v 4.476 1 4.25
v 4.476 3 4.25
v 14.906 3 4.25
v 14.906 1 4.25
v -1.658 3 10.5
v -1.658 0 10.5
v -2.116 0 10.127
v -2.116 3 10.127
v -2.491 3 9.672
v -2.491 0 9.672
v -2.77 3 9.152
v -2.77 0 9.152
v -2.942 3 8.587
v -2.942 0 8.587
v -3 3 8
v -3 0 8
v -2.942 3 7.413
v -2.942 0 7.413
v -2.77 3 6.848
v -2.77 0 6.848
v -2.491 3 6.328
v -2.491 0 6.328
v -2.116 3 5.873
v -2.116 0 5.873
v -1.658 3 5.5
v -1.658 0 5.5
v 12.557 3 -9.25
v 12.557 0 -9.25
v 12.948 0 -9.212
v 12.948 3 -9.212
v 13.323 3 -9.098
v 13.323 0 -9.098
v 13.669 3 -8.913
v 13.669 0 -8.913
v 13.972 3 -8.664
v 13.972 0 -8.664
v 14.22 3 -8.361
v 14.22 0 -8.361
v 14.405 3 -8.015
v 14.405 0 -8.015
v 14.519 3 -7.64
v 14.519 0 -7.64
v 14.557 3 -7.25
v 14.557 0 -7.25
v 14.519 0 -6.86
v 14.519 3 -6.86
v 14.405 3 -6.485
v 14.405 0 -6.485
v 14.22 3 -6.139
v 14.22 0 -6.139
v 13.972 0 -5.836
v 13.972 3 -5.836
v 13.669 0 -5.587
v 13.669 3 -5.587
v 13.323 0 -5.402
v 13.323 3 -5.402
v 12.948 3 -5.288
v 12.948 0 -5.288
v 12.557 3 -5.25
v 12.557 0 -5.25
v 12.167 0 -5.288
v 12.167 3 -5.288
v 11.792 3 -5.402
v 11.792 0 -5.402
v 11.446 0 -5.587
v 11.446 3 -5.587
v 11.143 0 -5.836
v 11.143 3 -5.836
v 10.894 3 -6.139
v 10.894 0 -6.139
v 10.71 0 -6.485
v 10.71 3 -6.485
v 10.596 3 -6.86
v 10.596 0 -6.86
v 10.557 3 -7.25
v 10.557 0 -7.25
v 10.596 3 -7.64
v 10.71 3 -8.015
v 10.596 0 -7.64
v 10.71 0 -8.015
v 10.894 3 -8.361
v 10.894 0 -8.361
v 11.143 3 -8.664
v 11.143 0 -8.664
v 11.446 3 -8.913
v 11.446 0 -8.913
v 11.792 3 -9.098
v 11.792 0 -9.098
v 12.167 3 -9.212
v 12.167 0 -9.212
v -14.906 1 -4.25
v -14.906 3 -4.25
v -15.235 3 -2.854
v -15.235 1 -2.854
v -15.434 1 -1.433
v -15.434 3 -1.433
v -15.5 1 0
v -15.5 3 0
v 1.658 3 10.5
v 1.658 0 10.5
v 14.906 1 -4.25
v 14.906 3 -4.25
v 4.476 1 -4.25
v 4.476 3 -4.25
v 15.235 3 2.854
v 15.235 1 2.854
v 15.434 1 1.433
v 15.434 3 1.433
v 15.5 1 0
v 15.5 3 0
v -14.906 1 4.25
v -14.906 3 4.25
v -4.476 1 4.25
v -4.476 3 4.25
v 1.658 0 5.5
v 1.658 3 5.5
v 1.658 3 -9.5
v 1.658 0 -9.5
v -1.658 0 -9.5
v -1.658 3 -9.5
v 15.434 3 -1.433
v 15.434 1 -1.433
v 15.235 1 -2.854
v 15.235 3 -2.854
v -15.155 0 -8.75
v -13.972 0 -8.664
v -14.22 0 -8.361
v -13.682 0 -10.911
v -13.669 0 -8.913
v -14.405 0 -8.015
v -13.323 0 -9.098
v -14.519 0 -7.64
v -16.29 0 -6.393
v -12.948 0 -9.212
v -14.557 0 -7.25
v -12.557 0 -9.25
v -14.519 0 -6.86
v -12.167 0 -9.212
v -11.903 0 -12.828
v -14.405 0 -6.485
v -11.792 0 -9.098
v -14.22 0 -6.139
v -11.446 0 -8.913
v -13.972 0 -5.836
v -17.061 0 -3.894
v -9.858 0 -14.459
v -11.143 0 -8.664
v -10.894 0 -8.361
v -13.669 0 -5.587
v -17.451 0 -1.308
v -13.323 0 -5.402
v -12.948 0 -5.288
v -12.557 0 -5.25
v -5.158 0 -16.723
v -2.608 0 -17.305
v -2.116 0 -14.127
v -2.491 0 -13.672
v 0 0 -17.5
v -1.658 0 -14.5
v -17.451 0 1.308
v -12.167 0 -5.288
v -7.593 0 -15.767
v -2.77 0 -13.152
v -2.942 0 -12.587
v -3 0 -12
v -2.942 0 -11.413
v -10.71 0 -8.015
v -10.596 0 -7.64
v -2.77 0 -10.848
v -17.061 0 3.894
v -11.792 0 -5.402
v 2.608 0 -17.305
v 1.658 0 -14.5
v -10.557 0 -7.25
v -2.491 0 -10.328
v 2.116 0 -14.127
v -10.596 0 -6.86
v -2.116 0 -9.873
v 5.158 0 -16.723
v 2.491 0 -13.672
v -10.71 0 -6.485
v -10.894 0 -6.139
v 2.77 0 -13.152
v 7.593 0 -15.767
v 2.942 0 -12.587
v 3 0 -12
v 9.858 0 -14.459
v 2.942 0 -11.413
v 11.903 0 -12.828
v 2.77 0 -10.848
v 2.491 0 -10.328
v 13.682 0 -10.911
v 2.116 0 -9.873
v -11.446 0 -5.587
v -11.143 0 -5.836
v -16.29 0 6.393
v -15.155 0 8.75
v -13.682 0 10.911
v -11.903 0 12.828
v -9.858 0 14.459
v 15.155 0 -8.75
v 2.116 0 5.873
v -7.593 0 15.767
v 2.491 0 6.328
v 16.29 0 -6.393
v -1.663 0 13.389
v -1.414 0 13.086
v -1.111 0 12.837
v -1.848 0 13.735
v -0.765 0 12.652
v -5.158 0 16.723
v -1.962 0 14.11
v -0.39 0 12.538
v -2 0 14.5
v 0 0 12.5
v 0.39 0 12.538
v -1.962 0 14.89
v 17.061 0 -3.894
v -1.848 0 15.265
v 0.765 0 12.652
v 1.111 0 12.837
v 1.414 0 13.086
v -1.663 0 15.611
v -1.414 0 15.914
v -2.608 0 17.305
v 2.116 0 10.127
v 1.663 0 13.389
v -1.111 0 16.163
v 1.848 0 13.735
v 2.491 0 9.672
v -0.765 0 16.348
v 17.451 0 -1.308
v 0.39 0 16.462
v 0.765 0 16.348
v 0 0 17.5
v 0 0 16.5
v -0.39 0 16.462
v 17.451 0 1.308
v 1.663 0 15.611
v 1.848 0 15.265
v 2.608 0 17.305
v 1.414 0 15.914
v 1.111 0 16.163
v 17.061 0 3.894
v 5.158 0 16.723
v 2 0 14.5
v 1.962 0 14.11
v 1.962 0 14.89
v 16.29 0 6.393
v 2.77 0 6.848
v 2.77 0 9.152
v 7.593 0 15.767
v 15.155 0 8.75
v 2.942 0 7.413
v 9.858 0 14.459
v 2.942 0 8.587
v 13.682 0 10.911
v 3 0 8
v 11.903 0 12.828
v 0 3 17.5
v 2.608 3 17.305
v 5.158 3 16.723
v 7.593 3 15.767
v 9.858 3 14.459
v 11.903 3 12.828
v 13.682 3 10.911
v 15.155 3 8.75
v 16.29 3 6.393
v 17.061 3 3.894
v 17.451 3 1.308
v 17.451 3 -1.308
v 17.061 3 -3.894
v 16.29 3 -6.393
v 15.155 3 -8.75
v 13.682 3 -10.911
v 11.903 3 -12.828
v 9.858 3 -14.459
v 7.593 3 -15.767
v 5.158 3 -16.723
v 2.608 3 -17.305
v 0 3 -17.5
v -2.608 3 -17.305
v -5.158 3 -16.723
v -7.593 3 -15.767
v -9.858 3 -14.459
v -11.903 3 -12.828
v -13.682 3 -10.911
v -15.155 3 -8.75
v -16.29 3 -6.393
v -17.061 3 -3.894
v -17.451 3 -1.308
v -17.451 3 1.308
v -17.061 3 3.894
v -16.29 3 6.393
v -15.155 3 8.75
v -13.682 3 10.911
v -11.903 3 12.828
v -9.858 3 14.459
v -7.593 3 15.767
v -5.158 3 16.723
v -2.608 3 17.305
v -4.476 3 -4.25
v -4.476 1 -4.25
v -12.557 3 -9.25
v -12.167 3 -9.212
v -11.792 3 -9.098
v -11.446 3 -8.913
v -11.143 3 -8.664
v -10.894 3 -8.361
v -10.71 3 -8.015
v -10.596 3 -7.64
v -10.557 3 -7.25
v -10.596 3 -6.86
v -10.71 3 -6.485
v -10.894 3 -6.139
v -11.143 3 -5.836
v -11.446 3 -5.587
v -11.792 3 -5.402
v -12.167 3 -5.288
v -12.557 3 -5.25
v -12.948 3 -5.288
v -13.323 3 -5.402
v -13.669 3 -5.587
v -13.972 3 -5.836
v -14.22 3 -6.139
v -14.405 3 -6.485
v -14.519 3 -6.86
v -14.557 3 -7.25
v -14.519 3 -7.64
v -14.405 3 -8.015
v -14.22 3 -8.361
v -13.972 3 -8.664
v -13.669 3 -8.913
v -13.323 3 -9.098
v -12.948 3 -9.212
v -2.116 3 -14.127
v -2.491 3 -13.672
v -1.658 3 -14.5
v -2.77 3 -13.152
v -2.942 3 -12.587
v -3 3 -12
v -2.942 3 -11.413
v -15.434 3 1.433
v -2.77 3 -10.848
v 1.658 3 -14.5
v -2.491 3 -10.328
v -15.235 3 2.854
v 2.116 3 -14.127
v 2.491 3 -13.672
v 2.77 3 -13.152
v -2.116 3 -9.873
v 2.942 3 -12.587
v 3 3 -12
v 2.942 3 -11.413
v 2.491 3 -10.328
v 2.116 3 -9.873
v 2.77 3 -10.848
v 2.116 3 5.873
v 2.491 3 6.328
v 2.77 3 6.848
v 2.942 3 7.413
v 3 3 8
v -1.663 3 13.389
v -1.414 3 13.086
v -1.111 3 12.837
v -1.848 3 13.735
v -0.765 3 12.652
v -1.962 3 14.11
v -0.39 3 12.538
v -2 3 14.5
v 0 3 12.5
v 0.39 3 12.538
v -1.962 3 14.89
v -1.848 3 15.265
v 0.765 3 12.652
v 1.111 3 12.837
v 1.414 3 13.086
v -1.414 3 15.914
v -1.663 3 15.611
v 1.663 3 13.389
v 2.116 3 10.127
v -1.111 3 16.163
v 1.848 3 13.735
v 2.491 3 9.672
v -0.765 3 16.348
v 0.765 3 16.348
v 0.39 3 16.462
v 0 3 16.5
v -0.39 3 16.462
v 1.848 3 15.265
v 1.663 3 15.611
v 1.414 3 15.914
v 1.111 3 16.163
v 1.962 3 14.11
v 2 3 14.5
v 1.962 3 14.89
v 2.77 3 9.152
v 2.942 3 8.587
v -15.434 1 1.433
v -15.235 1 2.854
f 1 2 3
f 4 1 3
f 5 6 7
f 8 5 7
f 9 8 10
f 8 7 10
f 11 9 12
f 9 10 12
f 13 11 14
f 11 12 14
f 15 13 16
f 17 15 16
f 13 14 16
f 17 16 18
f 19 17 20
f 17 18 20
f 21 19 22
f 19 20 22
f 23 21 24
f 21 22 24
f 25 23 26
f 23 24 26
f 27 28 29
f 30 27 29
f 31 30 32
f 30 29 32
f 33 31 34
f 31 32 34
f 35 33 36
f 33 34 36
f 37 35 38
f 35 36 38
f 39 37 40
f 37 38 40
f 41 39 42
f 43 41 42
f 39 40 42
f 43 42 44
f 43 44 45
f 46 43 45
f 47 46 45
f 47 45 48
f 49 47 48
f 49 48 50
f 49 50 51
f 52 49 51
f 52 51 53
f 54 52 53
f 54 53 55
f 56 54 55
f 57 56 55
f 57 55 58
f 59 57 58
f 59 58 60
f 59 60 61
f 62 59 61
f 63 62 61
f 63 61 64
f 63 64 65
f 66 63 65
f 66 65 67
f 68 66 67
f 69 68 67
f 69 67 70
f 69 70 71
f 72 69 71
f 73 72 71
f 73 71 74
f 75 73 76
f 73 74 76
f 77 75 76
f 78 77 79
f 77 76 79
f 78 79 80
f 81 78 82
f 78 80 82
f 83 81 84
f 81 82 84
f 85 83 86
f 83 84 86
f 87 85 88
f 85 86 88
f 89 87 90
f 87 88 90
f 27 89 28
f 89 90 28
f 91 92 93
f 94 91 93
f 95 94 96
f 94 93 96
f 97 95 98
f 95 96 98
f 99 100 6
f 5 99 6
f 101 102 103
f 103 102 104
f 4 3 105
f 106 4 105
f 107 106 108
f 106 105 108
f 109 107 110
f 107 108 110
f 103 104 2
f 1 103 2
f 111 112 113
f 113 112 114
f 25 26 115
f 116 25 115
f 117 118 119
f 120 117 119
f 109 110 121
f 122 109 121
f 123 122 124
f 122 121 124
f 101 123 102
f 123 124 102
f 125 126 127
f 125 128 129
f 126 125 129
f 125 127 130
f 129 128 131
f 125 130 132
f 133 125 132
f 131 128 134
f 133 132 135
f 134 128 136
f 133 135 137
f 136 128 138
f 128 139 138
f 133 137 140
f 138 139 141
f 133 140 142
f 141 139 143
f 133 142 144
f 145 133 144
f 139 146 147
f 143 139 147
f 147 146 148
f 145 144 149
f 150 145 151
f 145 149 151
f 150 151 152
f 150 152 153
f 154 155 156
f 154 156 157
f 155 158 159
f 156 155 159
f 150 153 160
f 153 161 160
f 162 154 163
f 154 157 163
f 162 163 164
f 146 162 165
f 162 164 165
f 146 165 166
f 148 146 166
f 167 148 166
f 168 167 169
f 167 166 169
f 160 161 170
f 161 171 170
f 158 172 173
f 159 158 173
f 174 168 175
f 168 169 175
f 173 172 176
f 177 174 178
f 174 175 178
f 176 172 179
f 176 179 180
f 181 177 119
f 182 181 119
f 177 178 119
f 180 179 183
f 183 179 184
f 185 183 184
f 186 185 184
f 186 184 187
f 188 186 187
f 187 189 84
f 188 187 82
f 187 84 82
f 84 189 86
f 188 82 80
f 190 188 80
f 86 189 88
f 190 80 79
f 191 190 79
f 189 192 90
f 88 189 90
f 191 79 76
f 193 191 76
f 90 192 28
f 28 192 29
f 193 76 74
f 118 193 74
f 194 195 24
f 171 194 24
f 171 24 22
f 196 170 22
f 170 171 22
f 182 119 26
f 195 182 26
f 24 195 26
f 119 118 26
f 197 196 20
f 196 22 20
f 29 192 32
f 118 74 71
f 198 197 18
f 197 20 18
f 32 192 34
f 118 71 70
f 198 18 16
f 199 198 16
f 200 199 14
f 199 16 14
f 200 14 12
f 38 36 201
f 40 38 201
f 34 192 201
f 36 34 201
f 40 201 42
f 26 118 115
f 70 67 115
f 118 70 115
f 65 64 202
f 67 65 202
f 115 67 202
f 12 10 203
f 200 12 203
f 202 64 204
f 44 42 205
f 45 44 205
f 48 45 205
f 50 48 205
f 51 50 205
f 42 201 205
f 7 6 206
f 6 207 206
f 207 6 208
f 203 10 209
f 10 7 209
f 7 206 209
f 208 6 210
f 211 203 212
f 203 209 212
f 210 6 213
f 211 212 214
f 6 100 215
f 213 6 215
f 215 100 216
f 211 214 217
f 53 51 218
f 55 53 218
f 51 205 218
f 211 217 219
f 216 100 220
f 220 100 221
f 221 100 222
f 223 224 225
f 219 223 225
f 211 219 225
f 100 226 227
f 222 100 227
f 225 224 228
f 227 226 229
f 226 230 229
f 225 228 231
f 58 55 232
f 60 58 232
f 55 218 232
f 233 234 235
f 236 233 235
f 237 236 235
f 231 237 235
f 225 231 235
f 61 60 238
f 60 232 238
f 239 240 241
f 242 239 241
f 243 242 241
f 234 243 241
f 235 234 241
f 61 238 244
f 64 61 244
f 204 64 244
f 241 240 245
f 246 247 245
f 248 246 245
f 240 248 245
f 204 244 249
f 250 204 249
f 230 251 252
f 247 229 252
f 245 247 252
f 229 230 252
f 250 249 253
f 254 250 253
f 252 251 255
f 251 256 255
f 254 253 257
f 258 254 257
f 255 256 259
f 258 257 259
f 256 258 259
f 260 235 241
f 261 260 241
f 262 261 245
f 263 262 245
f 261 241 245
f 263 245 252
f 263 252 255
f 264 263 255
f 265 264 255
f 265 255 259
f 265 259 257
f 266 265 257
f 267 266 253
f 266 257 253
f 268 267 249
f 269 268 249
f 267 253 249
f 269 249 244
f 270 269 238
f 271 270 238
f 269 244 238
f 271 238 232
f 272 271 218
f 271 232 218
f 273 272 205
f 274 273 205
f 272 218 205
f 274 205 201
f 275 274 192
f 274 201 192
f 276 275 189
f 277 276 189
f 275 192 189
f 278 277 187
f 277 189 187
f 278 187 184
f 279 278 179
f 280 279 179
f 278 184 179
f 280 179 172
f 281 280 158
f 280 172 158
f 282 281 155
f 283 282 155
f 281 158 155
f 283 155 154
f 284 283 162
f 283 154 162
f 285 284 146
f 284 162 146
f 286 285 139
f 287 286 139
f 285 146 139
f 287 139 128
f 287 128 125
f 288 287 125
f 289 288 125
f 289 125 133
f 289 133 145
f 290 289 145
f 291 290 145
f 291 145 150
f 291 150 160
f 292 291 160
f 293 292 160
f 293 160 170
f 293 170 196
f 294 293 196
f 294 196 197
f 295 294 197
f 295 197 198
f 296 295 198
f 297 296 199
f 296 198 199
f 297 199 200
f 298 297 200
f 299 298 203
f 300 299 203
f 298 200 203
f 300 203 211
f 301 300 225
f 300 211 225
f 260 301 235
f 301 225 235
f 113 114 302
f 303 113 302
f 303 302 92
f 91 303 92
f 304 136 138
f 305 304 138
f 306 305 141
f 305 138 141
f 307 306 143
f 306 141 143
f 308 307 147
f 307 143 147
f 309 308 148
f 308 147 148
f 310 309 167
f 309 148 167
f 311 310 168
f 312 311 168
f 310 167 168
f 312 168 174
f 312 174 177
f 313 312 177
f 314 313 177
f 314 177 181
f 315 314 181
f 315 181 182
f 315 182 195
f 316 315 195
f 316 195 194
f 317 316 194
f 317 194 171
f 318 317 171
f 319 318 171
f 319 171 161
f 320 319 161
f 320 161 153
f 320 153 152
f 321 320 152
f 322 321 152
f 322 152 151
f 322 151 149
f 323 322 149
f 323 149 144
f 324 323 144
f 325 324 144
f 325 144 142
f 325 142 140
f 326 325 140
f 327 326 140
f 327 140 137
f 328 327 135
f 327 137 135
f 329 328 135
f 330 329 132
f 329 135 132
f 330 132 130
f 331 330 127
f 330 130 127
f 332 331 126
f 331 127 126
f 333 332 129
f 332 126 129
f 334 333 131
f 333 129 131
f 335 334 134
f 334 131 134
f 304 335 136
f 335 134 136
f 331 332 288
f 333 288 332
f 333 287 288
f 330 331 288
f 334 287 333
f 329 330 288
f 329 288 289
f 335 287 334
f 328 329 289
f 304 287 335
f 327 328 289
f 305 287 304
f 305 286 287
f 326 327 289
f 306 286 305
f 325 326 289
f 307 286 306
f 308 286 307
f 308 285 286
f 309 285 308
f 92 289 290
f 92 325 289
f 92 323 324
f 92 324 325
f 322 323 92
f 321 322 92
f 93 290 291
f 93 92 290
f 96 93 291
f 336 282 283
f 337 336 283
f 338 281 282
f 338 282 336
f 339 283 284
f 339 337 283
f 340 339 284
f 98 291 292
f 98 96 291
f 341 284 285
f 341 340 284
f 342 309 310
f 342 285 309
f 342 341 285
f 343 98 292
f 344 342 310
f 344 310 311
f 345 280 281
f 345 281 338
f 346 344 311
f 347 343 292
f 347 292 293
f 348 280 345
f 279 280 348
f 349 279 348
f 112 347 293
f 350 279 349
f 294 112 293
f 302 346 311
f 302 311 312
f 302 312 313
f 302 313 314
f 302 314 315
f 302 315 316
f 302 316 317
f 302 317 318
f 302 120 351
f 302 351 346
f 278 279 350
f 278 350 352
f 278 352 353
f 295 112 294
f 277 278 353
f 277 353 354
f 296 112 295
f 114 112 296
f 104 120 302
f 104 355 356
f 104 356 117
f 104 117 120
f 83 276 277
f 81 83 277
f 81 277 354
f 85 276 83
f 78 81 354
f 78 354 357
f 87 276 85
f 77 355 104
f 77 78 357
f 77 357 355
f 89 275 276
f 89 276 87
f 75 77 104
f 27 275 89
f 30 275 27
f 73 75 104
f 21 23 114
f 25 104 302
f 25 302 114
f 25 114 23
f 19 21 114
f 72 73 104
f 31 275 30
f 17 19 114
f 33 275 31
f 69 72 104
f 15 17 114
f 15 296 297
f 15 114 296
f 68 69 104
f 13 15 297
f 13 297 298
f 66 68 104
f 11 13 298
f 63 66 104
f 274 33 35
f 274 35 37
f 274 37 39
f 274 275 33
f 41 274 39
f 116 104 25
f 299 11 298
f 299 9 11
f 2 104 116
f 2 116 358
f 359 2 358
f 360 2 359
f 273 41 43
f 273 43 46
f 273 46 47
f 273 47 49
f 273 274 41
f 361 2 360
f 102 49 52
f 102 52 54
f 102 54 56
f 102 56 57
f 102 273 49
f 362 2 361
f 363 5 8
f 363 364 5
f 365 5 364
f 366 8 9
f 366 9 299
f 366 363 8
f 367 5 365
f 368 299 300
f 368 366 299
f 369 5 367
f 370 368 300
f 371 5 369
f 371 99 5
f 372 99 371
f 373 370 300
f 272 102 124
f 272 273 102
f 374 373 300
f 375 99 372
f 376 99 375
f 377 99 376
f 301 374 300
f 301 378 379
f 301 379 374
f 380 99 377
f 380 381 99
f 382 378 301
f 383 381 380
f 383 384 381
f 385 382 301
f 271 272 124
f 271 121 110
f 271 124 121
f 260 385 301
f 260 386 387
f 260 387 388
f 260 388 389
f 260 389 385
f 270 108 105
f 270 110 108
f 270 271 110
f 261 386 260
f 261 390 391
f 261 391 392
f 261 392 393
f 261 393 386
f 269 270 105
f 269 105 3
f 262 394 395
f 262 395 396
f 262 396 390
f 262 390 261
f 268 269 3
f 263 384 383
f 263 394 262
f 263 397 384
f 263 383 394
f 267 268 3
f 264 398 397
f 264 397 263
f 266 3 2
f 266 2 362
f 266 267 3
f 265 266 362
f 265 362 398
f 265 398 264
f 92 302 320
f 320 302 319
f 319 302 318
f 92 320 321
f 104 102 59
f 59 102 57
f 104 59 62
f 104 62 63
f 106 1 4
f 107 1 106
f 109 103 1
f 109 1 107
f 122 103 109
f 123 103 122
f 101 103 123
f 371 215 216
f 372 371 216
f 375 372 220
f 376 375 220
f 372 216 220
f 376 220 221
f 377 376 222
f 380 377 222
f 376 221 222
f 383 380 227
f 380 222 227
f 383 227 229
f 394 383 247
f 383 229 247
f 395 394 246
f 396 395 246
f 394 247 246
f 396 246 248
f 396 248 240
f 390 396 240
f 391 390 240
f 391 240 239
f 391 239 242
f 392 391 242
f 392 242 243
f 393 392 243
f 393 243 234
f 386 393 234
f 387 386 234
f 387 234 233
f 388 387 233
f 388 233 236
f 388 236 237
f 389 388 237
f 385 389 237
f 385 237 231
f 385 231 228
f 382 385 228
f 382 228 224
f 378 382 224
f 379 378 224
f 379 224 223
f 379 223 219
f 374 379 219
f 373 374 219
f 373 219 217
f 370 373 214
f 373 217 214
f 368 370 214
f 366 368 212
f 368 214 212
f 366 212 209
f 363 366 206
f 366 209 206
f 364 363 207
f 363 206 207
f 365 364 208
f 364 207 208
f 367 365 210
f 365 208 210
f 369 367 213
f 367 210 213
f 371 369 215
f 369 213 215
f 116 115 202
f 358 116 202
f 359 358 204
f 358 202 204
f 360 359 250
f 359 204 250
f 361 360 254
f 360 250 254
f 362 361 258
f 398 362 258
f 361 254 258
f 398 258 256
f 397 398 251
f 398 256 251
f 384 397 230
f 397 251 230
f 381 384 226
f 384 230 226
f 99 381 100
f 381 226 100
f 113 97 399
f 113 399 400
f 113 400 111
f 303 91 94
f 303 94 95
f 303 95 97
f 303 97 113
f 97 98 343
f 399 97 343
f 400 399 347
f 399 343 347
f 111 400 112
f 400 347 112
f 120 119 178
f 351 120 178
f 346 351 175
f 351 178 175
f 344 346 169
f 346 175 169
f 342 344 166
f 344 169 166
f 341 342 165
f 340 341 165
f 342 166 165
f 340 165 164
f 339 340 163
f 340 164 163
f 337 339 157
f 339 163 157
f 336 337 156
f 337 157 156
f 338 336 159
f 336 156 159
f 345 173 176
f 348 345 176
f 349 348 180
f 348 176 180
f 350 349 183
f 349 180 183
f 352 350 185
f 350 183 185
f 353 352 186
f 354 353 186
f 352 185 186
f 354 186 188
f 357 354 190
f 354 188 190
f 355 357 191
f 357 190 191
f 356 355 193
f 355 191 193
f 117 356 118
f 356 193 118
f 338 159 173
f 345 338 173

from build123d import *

# Parameters (mm, degrees)
CROQUIS1_R              = 17.5
CROQUIS1_R_2            = 13.5
SALIENTE_EXTRUIR1_DEPTH = 3
CORTAR_EXTRUIR1_DEPTH   = 2
CROQUIS3_R              = 2
CORTAR_EXTRUIR2_DEPTH   = 25.929901725
CORTAR_EXTRUIR3_DEPTH   = 10


with BuildPart() as part:
    # Croquis1 → Saliente-Extruir1 (new body)
    with BuildSketch(Plane(origin=(0, 0, 0), x_dir=(1, 0, 0), z_dir=(0, 1, 0))):
        with Locations(Location((0, 0, 0), (0, 0, 270))):
            Circle(CROQUIS1_R)
        Circle(CROQUIS1_R_2, mode=Mode.SUBTRACT)
        Circle(CROQUIS1_R_2)
    extrude(amount=SALIENTE_EXTRUIR1_DEPTH)

    # Croquis2 → Cortar-Extruir1 (cut)
    with BuildSketch(Plane(origin=(0, 3, 0), x_dir=(1, 0, 0), z_dir=(0, 1, 0))):
        with BuildLine():
            Line((-15.5, 0), (-4.476086121, 0))
            Line((-4.476086121, 0), (-4.476086121, 4.25))
            Line((-4.476086121, 4.25), (-14.905955186, 4.25))
            ThreePointArc((-14.905955186, 4.25), (-15.350770427, 2.14565778), (-15.5, 0))
        make_face()
        with BuildLine():
            Line((-4.476086121, -4.25), (-4.476086121, 0))
            Line((-4.476086121, 0), (-15.5, 0))
            ThreePointArc((-15.5, 0), (-15.350770427, -2.14565778), (-14.905955186, -4.25))
            Line((-14.905955186, -4.25), (-4.476086121, -4.25))
        make_face()
        with BuildLine():
            ThreePointArc((15.5, 0), (15.350770427, 2.14565778), (14.905955186, 4.25))
            Line((14.905955186, 4.25), (4.476086121, 4.25))
            Line((4.476086121, 4.25), (4.476086121, -4.25))
            Line((4.476086121, -4.25), (14.905955186, -4.25))
            ThreePointArc((14.905955186, -4.25), (15.350770427, -2.14565778), (15.5, 0))
        make_face()
    extrude(amount=-CORTAR_EXTRUIR1_DEPTH, mode=Mode.SUBTRACT)

    # Croquis3 → Cortar-Extruir2 (cut, through all)
    with BuildSketch(Plane(origin=(0, 0, 0), x_dir=(-1, 0, 0), z_dir=(0, -1, 0))):
        with Locations(Location((0, -14.5, 0), (0, 0, 90))):
            Circle(CROQUIS3_R)
        with Locations(Location((12.557368355, 7.25, 0), (0, 0, 90))):
            Circle(CROQUIS3_R)
        with Locations(Location((-12.557368355, 7.25, 0), (0, 0, 90))):
            Circle(CROQUIS3_R)
    extrude(amount=-CORTAR_EXTRUIR2_DEPTH, mode=Mode.SUBTRACT)

    # Croquis4 → Cortar-Extruir3 (cut)
    with BuildSketch(Plane(origin=(0, 0, 0), x_dir=(-1, 0, 0), z_dir=(0, -1, 0))):
        with BuildLine():
            Line((1.658312395, 14.5), (-1.658312395, 14.5))
            ThreePointArc((-1.658312395, 14.5), (-3, 12), (-1.658312395, 9.5))
            Line((-1.658312395, 9.5), (1.658312395, 9.5))
            ThreePointArc((1.658312395, 9.5), (3, 12), (1.658312395, 14.5))
        make_face()
        with BuildLine():
            Line((1.658312395, -5.5), (-1.658312395, -5.5))
            ThreePointArc((-1.658312395, -5.5), (-3, -8), (-1.658312395, -10.5))
            Line((-1.658312395, -10.5), (1.658312395, -10.5))
            ThreePointArc((1.658312395, -10.5), (3, -8), (1.658312395, -5.5))
        make_face()
    extrude(amount=-CORTAR_EXTRUIR3_DEPTH, mode=Mode.SUBTRACT)


solid = part.part
